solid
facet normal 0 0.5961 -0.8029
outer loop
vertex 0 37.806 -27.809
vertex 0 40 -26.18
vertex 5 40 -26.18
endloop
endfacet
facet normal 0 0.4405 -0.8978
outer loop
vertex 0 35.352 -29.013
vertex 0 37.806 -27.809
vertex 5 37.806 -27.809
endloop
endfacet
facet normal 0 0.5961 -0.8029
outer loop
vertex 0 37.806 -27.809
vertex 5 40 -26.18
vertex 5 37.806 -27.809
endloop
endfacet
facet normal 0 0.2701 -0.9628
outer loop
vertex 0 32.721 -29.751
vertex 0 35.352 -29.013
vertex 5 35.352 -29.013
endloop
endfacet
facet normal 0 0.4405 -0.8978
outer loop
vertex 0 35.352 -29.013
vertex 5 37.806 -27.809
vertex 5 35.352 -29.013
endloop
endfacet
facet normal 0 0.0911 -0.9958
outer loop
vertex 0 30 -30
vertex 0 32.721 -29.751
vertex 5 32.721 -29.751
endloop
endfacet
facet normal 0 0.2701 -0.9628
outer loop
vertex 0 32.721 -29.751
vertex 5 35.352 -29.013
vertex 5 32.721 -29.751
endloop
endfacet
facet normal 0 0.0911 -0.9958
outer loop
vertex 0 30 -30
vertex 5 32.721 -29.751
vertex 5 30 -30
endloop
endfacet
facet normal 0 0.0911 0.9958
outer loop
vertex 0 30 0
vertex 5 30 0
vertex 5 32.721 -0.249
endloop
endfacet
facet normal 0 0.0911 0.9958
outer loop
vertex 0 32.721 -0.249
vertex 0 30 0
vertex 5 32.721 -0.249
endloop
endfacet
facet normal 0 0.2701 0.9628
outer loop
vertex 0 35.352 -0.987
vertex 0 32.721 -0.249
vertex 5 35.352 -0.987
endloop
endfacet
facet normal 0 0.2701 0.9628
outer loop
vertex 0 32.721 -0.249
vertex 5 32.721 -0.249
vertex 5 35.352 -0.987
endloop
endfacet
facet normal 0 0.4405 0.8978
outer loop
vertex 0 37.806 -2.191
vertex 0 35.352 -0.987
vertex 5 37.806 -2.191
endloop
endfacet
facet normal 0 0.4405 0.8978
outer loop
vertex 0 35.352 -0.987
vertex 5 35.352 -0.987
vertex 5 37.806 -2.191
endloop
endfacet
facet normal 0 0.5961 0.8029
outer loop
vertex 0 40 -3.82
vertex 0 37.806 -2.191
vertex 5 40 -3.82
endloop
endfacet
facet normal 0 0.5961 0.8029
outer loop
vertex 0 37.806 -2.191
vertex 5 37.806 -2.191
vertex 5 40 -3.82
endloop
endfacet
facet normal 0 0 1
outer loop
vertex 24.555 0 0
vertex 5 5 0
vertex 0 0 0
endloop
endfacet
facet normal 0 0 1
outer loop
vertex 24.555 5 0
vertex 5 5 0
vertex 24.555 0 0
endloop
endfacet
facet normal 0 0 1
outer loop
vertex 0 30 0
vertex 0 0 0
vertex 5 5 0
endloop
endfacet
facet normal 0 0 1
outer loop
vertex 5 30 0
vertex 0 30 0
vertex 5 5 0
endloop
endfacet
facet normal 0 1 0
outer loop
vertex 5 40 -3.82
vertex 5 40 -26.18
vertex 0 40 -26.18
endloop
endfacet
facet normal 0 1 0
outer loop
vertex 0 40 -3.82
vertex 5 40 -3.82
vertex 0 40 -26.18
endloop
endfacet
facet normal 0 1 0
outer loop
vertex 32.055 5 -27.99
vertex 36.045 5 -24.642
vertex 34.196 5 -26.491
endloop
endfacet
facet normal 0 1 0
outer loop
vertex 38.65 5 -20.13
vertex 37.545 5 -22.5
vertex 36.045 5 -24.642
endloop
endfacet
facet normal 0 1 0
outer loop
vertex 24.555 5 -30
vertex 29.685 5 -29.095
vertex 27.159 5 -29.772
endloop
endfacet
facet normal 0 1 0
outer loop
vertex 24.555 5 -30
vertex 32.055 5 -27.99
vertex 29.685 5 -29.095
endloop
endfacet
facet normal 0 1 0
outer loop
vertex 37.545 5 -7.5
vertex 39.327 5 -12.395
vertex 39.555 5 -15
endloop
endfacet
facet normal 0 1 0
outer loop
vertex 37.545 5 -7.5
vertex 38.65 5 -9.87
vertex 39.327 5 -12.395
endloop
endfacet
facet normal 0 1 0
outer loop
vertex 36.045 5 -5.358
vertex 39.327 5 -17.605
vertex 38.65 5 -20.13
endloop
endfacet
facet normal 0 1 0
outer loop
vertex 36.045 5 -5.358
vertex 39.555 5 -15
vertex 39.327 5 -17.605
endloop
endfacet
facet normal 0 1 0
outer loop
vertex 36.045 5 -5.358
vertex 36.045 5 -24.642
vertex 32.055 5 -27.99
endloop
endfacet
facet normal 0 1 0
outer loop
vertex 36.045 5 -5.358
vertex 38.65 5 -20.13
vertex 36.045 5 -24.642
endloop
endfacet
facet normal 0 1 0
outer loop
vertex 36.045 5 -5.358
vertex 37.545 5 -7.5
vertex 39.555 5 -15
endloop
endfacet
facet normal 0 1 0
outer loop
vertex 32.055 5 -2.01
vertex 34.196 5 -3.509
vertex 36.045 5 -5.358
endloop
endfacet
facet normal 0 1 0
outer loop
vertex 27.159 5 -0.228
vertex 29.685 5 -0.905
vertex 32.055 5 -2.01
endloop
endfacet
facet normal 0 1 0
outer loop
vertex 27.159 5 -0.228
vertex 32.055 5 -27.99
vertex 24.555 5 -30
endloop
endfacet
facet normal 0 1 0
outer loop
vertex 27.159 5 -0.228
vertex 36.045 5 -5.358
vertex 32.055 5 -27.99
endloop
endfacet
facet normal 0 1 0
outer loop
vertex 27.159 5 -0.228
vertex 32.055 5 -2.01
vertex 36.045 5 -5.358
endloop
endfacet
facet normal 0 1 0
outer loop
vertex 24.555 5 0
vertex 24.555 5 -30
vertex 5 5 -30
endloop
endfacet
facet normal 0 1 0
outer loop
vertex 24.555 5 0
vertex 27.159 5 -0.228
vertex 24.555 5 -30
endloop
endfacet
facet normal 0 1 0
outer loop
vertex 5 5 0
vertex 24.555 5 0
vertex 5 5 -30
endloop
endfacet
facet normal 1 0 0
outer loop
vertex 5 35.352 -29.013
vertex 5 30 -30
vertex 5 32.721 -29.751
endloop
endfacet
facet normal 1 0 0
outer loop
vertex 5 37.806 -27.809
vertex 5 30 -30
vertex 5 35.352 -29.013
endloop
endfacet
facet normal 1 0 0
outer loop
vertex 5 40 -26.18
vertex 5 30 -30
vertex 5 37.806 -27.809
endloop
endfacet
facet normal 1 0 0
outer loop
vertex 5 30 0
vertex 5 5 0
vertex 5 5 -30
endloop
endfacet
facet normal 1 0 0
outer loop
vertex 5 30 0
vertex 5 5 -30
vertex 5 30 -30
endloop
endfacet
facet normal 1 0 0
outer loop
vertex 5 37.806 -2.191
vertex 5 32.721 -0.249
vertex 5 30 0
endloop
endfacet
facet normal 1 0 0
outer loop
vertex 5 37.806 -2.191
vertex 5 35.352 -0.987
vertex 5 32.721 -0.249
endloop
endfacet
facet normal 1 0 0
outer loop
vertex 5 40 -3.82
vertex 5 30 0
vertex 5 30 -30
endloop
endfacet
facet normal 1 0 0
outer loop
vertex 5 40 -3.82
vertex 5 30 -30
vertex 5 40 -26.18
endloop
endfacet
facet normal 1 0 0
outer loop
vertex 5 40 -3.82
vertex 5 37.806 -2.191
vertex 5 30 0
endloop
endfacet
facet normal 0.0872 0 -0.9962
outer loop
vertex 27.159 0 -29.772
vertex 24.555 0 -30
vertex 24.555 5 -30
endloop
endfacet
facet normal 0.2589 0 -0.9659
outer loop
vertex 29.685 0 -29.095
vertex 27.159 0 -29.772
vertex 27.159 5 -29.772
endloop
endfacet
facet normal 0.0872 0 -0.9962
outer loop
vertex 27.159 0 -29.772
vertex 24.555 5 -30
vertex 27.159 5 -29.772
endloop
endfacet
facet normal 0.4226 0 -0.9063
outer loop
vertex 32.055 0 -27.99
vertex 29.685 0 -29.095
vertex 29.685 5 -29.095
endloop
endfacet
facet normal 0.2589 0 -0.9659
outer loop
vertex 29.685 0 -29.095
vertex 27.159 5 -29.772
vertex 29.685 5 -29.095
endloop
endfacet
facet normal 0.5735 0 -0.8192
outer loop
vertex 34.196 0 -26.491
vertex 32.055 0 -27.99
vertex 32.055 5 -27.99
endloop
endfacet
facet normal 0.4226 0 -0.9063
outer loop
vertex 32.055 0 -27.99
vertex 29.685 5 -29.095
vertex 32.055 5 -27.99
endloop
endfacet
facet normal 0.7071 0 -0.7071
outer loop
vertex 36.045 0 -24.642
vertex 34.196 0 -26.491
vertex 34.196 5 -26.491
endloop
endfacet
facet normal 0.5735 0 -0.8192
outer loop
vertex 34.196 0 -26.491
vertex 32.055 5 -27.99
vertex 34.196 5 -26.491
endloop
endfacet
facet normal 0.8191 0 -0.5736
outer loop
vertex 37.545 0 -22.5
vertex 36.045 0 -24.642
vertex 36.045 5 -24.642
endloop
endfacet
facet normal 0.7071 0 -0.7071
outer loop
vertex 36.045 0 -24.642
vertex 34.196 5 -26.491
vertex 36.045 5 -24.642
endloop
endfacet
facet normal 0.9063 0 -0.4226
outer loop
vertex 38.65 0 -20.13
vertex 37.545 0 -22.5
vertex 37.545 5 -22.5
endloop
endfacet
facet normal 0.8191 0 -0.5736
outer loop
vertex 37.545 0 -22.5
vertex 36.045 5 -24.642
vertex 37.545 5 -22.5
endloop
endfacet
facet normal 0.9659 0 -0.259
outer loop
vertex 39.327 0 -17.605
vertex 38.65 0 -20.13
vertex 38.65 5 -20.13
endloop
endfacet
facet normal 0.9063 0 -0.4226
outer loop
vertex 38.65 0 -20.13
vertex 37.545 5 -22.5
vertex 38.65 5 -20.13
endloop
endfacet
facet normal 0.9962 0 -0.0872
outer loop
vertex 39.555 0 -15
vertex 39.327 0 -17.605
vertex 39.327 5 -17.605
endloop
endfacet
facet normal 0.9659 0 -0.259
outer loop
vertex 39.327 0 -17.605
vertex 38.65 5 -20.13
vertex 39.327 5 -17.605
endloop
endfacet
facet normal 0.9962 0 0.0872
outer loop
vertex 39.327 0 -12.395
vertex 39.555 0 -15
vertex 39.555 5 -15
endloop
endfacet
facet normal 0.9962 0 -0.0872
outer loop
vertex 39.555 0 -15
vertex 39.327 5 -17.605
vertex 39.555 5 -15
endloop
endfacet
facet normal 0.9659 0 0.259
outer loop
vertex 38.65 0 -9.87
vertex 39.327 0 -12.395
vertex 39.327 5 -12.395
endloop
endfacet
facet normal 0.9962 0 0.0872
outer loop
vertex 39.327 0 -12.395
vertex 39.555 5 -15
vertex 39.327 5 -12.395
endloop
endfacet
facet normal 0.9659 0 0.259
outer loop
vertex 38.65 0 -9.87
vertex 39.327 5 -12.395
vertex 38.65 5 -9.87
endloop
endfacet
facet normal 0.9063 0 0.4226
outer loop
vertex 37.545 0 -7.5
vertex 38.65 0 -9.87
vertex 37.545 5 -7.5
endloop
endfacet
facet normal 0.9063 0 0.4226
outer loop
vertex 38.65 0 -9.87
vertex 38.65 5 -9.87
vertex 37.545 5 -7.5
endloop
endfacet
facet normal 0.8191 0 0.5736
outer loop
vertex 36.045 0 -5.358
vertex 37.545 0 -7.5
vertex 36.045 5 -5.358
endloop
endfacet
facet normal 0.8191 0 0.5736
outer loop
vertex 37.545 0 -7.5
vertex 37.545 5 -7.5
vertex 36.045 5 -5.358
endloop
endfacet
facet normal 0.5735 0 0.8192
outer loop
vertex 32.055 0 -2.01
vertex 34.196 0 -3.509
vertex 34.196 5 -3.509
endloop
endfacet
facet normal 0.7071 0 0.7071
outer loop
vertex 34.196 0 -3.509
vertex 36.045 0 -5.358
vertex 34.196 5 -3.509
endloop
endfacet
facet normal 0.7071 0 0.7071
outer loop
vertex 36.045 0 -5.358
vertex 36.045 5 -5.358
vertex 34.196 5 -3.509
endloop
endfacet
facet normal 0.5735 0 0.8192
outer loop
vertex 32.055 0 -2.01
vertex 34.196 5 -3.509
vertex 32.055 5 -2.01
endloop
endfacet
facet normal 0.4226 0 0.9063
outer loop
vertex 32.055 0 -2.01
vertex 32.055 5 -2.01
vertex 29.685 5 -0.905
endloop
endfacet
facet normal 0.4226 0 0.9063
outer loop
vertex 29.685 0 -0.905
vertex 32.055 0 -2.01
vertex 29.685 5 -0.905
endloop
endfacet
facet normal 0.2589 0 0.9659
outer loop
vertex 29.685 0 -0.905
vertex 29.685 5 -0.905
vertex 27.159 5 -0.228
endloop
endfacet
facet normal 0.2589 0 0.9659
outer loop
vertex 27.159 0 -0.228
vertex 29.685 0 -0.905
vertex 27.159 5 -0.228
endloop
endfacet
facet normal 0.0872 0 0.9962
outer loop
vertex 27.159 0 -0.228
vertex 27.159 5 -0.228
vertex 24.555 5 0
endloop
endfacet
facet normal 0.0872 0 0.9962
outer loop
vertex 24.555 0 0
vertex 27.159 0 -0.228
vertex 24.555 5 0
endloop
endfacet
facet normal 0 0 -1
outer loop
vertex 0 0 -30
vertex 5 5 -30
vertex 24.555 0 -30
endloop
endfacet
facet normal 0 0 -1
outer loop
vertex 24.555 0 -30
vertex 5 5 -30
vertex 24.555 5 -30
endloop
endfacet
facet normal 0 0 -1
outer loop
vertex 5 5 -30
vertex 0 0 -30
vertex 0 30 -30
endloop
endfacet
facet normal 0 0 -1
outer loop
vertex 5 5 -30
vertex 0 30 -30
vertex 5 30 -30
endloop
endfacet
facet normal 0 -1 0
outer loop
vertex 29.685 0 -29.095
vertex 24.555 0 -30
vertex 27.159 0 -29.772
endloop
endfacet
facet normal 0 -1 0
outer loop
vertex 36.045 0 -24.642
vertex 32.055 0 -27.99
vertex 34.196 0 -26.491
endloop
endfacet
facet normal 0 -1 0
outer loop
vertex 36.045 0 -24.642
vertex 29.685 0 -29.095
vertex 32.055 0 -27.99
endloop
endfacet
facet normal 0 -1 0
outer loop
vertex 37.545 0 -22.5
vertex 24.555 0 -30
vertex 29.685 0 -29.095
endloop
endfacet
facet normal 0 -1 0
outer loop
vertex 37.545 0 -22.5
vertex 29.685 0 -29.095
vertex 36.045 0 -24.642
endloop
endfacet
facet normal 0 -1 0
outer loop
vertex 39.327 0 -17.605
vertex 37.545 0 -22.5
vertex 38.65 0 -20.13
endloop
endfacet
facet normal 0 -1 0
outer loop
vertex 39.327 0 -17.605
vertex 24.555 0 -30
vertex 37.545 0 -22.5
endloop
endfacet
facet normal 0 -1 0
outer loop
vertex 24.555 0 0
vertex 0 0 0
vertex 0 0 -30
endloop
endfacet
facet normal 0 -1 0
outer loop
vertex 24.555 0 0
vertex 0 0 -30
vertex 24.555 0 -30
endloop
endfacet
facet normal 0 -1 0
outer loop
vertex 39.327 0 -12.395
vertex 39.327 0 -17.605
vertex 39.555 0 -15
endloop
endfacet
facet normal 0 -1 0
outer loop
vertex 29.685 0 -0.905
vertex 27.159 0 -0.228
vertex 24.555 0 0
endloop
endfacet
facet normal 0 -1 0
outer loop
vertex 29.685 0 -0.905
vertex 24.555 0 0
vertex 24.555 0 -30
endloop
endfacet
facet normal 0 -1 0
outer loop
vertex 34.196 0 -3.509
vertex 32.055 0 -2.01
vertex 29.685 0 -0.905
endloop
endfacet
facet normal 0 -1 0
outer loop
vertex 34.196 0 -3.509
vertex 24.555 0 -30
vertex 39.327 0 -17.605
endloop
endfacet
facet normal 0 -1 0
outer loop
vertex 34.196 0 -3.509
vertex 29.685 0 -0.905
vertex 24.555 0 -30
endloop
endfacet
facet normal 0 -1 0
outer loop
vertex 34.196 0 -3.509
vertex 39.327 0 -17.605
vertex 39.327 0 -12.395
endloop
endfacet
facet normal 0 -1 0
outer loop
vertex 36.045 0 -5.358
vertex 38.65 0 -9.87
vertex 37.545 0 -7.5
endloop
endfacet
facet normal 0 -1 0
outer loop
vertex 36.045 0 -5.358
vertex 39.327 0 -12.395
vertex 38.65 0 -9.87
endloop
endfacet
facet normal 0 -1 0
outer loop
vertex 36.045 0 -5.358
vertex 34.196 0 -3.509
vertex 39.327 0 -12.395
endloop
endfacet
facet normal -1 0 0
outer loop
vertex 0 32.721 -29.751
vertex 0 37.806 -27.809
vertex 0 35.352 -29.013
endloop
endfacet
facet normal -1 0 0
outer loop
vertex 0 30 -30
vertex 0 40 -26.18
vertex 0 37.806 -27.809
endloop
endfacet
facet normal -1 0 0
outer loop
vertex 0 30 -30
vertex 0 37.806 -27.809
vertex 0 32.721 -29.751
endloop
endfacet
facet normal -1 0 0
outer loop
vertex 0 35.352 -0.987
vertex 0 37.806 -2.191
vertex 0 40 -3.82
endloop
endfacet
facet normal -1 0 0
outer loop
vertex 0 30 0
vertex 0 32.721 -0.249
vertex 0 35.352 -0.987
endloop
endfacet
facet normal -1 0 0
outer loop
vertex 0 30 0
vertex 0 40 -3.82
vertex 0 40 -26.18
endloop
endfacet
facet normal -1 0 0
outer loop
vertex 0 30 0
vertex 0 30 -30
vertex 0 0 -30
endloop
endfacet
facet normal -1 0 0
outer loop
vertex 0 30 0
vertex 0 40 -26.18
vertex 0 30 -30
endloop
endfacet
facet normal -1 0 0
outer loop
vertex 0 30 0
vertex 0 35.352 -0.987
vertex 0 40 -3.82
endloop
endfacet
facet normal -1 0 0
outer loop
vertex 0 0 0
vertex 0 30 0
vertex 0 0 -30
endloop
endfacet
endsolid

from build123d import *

# Parameters (mm, degrees)
F1_DEPTH = 30
F3_DEPTH = 15.3
F5_DEPTH = 25


with BuildPart() as f1:
    # F0 (on Top) → F1 (new body)
    with BuildSketch(Plane.XY):
        Polygon((4.9999998882, 40), (0, 40), (0, 0), (40, 0), (40, 4.9999998882), (4.9999998882, 4.9999998882), align=None)
    extrude(amount=-F1_DEPTH)

    # F2 (on face) → F3 (cut)
    with BuildSketch(Plane.YZ.offset(4.9999998882)):
        with BuildLine():
            Line((40, -3.8196602917), (40, 0))
            Line((40, 0), (29.9999997997, 0))
            ThreePointArc((29.9999997997, 0), (35.3523312718, -0.9874146635), (40, -3.8196602917))
        make_face()
        with BuildLine():
            Line((40, -30), (40, -26.1803397083))
            ThreePointArc((40, -26.1803397083), (35.3523313132, -29.0125853207), (29.9999998882, -30))
            Line((29.9999998882, -30), (40, -30))
        make_face()
    extrude(amount=-F3_DEPTH, mode=Mode.SUBTRACT)

    # F4 (on face) → F5 (cut)
    with BuildSketch(Plane(origin=(0, 4.9999998882, 0), x_dir=(-1, 0, 0), z_dir=(0, 1, 0))):
        with BuildLine():
            Line((-24.5546065271, 0), (-40, 0))
            Line((-40, 0), (-40, -30))
            Line((-40, -30), (-24.5546074611, -30))
            ThreePointArc((-24.5546074611, -30), (-39.5546074611, -14.999999533), (-24.5546065271, 0))
        make_face()
    extrude(amount=-F5_DEPTH, mode=Mode.SUBTRACT)


solid = f1.part
